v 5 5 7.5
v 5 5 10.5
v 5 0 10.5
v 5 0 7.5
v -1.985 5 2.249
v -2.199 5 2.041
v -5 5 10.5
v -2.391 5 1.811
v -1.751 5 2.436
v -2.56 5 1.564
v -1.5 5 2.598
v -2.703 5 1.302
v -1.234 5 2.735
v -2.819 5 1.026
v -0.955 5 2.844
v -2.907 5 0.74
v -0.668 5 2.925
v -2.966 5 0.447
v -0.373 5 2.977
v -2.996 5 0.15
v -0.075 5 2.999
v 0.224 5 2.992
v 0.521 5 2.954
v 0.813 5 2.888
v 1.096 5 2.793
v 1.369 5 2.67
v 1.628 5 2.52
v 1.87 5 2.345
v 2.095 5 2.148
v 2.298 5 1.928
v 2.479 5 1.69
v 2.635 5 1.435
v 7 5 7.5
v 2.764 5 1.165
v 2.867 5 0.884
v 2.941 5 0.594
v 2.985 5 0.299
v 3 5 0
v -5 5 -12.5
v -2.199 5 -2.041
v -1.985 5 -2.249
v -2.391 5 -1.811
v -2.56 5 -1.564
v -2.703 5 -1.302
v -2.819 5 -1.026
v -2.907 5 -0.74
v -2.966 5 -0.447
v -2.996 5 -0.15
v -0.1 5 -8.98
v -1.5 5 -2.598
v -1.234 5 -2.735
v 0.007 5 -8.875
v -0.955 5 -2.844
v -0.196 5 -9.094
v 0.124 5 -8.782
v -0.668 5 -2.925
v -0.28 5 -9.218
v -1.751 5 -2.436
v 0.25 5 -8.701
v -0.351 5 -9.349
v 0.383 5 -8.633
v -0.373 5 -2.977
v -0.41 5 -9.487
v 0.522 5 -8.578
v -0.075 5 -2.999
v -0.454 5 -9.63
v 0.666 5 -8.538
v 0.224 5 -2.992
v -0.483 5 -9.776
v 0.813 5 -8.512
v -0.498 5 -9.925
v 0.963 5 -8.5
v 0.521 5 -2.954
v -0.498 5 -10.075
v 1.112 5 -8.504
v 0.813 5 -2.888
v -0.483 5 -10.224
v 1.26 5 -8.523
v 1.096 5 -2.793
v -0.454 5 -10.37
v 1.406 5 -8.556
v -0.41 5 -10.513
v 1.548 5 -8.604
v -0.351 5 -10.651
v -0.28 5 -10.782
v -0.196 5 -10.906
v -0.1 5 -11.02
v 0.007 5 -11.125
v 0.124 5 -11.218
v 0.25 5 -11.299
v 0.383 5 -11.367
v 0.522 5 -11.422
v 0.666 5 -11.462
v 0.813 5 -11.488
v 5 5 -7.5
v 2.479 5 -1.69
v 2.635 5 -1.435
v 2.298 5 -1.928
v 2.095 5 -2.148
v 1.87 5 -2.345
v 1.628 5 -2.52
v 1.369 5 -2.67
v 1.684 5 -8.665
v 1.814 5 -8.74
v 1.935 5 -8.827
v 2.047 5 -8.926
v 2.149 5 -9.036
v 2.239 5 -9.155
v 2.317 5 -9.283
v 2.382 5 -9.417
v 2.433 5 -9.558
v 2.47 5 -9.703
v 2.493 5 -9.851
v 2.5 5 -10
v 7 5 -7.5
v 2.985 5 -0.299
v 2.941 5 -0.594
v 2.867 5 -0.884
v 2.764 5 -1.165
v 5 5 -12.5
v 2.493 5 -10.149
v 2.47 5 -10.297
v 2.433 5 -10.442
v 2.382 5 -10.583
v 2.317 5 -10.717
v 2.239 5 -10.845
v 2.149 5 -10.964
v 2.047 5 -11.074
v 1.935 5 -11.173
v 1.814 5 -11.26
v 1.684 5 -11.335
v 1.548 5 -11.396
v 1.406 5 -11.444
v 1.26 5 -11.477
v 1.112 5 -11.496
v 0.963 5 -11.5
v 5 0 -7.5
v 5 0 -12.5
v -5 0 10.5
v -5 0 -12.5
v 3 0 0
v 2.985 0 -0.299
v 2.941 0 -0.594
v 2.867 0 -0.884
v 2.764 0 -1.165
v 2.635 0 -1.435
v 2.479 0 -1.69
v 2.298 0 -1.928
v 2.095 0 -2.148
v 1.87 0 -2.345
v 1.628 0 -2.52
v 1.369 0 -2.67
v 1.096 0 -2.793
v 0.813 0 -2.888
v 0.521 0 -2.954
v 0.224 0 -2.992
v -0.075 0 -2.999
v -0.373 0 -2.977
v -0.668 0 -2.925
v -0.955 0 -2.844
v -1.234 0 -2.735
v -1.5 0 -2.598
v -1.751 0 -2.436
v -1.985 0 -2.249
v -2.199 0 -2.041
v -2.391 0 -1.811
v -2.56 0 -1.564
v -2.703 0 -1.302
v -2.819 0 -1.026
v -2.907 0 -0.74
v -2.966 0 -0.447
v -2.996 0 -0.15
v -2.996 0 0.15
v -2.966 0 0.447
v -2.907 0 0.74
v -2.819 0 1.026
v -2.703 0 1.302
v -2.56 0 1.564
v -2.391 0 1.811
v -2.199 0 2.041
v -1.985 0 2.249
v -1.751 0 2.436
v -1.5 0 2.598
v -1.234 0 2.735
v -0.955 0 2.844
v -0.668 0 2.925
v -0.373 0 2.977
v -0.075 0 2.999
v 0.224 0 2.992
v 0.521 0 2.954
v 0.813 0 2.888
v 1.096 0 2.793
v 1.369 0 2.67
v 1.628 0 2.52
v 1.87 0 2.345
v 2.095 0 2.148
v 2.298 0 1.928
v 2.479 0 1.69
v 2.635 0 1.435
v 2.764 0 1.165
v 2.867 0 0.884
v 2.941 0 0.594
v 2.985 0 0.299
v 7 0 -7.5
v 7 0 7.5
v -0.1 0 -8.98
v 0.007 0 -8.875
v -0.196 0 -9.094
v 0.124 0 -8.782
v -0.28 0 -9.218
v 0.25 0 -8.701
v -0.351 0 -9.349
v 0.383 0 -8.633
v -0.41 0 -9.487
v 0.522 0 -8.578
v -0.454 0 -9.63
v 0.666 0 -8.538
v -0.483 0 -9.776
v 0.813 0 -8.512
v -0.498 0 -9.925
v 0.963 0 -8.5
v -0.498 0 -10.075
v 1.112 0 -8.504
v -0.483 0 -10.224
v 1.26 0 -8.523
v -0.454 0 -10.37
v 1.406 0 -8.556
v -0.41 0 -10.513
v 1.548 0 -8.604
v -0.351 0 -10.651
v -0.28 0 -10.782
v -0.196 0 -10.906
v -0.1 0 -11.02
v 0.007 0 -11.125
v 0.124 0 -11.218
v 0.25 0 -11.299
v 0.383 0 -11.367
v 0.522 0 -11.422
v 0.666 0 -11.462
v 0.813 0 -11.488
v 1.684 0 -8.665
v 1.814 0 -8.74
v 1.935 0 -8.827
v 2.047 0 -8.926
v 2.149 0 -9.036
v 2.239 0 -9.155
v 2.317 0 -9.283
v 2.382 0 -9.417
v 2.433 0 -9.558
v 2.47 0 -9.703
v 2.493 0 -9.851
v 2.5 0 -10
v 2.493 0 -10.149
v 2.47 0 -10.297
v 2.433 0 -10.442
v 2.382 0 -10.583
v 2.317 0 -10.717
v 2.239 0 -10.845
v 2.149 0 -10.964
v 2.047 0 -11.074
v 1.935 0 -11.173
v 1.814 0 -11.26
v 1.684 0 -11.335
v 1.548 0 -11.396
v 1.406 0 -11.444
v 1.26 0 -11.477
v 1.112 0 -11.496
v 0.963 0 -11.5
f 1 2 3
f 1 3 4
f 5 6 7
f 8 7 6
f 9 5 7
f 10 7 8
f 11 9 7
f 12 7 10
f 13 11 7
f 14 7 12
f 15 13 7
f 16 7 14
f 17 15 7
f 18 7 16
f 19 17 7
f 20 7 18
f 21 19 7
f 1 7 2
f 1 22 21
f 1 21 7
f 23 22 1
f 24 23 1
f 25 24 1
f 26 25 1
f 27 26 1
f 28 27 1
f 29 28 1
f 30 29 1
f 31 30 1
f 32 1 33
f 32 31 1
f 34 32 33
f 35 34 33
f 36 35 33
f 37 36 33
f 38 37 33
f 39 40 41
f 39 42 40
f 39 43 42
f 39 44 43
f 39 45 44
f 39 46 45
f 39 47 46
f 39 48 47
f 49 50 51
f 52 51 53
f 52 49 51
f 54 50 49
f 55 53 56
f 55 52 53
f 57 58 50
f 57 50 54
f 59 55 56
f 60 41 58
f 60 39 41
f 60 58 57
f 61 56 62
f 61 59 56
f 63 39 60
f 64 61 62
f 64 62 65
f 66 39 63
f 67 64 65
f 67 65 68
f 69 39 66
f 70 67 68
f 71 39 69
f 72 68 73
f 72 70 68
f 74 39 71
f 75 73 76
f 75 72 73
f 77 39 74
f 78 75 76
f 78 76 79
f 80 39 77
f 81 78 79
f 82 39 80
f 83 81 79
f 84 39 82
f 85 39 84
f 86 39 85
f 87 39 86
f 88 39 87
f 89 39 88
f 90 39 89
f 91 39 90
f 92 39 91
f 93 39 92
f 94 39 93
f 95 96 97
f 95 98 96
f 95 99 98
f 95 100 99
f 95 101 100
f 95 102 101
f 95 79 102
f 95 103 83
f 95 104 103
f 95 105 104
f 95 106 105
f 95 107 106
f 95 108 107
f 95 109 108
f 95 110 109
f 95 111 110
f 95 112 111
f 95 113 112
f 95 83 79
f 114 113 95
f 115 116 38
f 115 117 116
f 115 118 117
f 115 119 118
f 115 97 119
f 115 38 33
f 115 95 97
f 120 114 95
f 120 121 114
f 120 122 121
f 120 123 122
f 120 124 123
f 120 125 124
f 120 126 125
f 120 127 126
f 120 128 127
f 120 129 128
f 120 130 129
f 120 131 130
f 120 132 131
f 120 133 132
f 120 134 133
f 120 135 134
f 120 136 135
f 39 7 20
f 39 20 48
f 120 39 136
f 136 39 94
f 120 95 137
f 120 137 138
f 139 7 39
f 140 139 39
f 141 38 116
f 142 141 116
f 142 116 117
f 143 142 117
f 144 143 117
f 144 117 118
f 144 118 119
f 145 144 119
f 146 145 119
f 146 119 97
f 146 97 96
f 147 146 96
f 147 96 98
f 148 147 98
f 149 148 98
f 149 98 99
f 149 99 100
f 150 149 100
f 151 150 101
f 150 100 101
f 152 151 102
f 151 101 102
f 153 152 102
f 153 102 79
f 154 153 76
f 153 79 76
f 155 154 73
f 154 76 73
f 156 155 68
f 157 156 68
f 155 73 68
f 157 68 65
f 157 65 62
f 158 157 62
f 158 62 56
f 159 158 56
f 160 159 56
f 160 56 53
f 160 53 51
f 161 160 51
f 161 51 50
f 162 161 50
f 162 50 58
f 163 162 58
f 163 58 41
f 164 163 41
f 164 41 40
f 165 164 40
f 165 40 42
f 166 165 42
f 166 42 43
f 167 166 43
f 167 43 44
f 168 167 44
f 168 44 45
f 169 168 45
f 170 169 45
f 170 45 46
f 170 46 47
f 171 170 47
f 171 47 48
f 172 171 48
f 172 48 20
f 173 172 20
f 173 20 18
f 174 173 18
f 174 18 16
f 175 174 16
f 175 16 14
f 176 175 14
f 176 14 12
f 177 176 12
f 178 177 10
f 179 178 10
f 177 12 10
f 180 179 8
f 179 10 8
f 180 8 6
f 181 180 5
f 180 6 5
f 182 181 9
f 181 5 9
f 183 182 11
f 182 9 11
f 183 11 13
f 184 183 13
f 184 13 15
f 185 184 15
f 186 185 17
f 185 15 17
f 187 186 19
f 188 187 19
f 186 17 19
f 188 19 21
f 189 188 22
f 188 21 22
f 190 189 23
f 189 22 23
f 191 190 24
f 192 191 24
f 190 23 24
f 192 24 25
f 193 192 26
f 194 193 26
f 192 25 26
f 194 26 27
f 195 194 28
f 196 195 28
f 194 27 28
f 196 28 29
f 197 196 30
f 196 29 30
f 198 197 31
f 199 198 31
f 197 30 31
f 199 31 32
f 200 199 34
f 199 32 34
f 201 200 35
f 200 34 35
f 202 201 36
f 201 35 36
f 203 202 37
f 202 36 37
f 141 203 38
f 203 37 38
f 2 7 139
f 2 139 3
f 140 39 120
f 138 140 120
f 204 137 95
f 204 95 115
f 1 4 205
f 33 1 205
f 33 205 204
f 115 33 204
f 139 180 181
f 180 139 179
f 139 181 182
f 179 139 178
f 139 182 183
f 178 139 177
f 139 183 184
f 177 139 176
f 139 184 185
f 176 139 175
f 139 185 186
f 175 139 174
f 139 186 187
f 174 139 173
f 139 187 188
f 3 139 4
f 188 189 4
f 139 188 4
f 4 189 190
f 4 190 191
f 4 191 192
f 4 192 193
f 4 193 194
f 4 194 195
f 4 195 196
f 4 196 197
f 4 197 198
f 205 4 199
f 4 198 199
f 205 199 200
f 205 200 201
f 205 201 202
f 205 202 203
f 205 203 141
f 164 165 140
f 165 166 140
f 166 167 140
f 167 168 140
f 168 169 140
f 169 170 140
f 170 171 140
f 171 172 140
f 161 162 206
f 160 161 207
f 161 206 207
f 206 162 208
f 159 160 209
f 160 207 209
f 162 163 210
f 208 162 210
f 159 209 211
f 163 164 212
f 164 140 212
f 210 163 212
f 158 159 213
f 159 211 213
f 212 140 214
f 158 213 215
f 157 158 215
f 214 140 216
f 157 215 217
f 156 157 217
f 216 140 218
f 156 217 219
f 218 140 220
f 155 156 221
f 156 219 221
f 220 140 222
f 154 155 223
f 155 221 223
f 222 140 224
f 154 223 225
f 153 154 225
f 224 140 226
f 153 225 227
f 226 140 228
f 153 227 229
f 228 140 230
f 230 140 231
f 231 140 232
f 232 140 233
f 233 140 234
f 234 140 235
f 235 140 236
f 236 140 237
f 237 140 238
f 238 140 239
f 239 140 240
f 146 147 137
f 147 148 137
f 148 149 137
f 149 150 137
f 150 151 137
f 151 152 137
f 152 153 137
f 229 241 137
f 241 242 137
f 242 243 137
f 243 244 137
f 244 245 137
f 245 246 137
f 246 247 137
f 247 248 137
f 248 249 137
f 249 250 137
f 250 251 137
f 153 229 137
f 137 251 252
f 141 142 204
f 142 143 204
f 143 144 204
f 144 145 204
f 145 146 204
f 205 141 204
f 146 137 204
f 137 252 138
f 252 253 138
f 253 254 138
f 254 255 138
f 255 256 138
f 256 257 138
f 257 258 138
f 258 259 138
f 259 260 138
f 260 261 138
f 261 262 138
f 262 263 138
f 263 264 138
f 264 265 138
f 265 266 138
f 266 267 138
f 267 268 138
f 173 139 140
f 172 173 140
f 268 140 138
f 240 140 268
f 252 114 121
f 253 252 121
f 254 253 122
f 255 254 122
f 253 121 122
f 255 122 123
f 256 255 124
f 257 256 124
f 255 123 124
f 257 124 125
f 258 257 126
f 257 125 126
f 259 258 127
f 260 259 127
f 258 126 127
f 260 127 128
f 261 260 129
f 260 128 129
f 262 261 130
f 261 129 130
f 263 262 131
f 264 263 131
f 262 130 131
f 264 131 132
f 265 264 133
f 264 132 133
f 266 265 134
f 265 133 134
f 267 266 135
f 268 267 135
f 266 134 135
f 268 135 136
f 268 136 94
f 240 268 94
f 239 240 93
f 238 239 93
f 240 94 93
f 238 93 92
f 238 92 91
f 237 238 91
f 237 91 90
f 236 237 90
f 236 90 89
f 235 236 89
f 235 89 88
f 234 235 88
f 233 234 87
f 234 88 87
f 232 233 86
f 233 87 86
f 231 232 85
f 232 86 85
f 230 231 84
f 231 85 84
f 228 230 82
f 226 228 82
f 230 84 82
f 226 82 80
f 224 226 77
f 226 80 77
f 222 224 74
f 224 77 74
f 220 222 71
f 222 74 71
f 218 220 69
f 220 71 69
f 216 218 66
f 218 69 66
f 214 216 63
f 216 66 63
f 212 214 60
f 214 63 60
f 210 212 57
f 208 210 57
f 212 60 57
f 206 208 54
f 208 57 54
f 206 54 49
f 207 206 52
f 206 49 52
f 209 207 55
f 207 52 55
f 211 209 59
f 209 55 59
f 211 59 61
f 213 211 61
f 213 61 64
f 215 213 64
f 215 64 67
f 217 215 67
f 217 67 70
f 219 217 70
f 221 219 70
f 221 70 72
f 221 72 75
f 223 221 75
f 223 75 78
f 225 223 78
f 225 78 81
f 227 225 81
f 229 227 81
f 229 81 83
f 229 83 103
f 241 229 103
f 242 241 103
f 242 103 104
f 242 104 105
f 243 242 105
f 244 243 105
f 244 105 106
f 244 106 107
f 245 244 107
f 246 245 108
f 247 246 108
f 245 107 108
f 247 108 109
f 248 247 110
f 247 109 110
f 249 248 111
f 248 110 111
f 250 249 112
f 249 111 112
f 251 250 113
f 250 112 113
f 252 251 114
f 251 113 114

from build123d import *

# Parameters (mm, degrees)
ESQUISSE1_W             = 12
ESQUISSE1_H             = 15
BOSS_EXTRU_1_DEPTH      = 5
ESQUISSE2_W             = 10
ESQUISSE2_H             = 5
ESQUISSE2_H_2           = 3
BOSS_EXTRU_2_DEPTH      = 5
ESQUISSE3_R             = 1.5
ENL_V_MAT_EXTRU_1_DEPTH = 5
ESQUISSE4_R             = 3
ENL_V_MAT_EXTRU_2_DEPTH = 10


with BuildPart() as part:
    # Esquisse1 → Boss.-Extru.1 (new body)
    with BuildSketch(Plane(origin=(0, 0, 0), x_dir=(1, 0, 0), z_dir=(0, 1, 0))):
        with Locations((1, 0)):
            Rectangle(ESQUISSE1_W, ESQUISSE1_H)
    extrude(amount=BOSS_EXTRU_1_DEPTH)

    # Esquisse2 → Boss.-Extru.2 (add)
    with BuildSketch(Plane(origin=(0, 5, 0), x_dir=(1, 0, 0), z_dir=(0, 1, 0))):
        with Locations((0, 10)):
            Rectangle(ESQUISSE2_W, ESQUISSE2_H)
        with Locations((0, -9)):
            Rectangle(ESQUISSE2_W, ESQUISSE2_H_2)
    extrude(amount=-BOSS_EXTRU_2_DEPTH)

    # Esquisse3 → Enlèv. mat.-Extru.1 (cut)
    with BuildSketch(Plane(origin=(0, 5, 0), x_dir=(1, 0, 0), z_dir=(0, 1, 0))):
        with Locations((1, 10)):
            Circle(ESQUISSE3_R)
    extrude(amount=-ENL_V_MAT_EXTRU_1_DEPTH, mode=Mode.SUBTRACT)

    # Esquisse4 → Enlèv. mat.-Extru.2 (cut)
    with BuildSketch(Plane(origin=(0, 5, 0), x_dir=(1, 0, 0), z_dir=(0, 1, 0))):
        Circle(ESQUISSE4_R)
    extrude(amount=-ENL_V_MAT_EXTRU_2_DEPTH, mode=Mode.SUBTRACT)


solid = part.part
